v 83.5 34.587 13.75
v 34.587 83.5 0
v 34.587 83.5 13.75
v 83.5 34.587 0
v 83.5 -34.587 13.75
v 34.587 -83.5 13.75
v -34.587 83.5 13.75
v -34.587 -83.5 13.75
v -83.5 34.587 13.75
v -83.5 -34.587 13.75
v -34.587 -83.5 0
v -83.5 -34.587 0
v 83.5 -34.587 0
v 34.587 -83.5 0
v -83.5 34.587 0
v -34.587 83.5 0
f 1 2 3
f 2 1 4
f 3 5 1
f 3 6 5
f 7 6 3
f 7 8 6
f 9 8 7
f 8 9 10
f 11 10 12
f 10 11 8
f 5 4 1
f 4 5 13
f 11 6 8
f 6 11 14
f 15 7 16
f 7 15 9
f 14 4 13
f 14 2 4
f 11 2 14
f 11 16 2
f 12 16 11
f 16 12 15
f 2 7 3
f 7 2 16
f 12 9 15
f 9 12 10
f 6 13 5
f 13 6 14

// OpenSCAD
// Generated by DescriptiveCAD bootstrap v0.2
color([0.8, 0.8, 0.8, 0.15]) {
  // boundary visualization
  linear_extrude(height=13.75) polygon(points=[[-34.586832, 83.500000], [34.586832, 83.500000], [83.500000, 34.586832], [83.500000, -34.586832], [34.586832, -83.500000], [-34.586832, -83.500000], [-83.500000, -34.586832], [-83.500000, 34.586832]]);
}
color([0, 0, 1, 1]) {
  translate([0,0,0]) linear_extrude(height=4) polygon(points=[[-10.000000, -10.000000], [10.000000, -10.000000], [10.000000, 10.000000], [-10.000000, 10.000000]]);
}
